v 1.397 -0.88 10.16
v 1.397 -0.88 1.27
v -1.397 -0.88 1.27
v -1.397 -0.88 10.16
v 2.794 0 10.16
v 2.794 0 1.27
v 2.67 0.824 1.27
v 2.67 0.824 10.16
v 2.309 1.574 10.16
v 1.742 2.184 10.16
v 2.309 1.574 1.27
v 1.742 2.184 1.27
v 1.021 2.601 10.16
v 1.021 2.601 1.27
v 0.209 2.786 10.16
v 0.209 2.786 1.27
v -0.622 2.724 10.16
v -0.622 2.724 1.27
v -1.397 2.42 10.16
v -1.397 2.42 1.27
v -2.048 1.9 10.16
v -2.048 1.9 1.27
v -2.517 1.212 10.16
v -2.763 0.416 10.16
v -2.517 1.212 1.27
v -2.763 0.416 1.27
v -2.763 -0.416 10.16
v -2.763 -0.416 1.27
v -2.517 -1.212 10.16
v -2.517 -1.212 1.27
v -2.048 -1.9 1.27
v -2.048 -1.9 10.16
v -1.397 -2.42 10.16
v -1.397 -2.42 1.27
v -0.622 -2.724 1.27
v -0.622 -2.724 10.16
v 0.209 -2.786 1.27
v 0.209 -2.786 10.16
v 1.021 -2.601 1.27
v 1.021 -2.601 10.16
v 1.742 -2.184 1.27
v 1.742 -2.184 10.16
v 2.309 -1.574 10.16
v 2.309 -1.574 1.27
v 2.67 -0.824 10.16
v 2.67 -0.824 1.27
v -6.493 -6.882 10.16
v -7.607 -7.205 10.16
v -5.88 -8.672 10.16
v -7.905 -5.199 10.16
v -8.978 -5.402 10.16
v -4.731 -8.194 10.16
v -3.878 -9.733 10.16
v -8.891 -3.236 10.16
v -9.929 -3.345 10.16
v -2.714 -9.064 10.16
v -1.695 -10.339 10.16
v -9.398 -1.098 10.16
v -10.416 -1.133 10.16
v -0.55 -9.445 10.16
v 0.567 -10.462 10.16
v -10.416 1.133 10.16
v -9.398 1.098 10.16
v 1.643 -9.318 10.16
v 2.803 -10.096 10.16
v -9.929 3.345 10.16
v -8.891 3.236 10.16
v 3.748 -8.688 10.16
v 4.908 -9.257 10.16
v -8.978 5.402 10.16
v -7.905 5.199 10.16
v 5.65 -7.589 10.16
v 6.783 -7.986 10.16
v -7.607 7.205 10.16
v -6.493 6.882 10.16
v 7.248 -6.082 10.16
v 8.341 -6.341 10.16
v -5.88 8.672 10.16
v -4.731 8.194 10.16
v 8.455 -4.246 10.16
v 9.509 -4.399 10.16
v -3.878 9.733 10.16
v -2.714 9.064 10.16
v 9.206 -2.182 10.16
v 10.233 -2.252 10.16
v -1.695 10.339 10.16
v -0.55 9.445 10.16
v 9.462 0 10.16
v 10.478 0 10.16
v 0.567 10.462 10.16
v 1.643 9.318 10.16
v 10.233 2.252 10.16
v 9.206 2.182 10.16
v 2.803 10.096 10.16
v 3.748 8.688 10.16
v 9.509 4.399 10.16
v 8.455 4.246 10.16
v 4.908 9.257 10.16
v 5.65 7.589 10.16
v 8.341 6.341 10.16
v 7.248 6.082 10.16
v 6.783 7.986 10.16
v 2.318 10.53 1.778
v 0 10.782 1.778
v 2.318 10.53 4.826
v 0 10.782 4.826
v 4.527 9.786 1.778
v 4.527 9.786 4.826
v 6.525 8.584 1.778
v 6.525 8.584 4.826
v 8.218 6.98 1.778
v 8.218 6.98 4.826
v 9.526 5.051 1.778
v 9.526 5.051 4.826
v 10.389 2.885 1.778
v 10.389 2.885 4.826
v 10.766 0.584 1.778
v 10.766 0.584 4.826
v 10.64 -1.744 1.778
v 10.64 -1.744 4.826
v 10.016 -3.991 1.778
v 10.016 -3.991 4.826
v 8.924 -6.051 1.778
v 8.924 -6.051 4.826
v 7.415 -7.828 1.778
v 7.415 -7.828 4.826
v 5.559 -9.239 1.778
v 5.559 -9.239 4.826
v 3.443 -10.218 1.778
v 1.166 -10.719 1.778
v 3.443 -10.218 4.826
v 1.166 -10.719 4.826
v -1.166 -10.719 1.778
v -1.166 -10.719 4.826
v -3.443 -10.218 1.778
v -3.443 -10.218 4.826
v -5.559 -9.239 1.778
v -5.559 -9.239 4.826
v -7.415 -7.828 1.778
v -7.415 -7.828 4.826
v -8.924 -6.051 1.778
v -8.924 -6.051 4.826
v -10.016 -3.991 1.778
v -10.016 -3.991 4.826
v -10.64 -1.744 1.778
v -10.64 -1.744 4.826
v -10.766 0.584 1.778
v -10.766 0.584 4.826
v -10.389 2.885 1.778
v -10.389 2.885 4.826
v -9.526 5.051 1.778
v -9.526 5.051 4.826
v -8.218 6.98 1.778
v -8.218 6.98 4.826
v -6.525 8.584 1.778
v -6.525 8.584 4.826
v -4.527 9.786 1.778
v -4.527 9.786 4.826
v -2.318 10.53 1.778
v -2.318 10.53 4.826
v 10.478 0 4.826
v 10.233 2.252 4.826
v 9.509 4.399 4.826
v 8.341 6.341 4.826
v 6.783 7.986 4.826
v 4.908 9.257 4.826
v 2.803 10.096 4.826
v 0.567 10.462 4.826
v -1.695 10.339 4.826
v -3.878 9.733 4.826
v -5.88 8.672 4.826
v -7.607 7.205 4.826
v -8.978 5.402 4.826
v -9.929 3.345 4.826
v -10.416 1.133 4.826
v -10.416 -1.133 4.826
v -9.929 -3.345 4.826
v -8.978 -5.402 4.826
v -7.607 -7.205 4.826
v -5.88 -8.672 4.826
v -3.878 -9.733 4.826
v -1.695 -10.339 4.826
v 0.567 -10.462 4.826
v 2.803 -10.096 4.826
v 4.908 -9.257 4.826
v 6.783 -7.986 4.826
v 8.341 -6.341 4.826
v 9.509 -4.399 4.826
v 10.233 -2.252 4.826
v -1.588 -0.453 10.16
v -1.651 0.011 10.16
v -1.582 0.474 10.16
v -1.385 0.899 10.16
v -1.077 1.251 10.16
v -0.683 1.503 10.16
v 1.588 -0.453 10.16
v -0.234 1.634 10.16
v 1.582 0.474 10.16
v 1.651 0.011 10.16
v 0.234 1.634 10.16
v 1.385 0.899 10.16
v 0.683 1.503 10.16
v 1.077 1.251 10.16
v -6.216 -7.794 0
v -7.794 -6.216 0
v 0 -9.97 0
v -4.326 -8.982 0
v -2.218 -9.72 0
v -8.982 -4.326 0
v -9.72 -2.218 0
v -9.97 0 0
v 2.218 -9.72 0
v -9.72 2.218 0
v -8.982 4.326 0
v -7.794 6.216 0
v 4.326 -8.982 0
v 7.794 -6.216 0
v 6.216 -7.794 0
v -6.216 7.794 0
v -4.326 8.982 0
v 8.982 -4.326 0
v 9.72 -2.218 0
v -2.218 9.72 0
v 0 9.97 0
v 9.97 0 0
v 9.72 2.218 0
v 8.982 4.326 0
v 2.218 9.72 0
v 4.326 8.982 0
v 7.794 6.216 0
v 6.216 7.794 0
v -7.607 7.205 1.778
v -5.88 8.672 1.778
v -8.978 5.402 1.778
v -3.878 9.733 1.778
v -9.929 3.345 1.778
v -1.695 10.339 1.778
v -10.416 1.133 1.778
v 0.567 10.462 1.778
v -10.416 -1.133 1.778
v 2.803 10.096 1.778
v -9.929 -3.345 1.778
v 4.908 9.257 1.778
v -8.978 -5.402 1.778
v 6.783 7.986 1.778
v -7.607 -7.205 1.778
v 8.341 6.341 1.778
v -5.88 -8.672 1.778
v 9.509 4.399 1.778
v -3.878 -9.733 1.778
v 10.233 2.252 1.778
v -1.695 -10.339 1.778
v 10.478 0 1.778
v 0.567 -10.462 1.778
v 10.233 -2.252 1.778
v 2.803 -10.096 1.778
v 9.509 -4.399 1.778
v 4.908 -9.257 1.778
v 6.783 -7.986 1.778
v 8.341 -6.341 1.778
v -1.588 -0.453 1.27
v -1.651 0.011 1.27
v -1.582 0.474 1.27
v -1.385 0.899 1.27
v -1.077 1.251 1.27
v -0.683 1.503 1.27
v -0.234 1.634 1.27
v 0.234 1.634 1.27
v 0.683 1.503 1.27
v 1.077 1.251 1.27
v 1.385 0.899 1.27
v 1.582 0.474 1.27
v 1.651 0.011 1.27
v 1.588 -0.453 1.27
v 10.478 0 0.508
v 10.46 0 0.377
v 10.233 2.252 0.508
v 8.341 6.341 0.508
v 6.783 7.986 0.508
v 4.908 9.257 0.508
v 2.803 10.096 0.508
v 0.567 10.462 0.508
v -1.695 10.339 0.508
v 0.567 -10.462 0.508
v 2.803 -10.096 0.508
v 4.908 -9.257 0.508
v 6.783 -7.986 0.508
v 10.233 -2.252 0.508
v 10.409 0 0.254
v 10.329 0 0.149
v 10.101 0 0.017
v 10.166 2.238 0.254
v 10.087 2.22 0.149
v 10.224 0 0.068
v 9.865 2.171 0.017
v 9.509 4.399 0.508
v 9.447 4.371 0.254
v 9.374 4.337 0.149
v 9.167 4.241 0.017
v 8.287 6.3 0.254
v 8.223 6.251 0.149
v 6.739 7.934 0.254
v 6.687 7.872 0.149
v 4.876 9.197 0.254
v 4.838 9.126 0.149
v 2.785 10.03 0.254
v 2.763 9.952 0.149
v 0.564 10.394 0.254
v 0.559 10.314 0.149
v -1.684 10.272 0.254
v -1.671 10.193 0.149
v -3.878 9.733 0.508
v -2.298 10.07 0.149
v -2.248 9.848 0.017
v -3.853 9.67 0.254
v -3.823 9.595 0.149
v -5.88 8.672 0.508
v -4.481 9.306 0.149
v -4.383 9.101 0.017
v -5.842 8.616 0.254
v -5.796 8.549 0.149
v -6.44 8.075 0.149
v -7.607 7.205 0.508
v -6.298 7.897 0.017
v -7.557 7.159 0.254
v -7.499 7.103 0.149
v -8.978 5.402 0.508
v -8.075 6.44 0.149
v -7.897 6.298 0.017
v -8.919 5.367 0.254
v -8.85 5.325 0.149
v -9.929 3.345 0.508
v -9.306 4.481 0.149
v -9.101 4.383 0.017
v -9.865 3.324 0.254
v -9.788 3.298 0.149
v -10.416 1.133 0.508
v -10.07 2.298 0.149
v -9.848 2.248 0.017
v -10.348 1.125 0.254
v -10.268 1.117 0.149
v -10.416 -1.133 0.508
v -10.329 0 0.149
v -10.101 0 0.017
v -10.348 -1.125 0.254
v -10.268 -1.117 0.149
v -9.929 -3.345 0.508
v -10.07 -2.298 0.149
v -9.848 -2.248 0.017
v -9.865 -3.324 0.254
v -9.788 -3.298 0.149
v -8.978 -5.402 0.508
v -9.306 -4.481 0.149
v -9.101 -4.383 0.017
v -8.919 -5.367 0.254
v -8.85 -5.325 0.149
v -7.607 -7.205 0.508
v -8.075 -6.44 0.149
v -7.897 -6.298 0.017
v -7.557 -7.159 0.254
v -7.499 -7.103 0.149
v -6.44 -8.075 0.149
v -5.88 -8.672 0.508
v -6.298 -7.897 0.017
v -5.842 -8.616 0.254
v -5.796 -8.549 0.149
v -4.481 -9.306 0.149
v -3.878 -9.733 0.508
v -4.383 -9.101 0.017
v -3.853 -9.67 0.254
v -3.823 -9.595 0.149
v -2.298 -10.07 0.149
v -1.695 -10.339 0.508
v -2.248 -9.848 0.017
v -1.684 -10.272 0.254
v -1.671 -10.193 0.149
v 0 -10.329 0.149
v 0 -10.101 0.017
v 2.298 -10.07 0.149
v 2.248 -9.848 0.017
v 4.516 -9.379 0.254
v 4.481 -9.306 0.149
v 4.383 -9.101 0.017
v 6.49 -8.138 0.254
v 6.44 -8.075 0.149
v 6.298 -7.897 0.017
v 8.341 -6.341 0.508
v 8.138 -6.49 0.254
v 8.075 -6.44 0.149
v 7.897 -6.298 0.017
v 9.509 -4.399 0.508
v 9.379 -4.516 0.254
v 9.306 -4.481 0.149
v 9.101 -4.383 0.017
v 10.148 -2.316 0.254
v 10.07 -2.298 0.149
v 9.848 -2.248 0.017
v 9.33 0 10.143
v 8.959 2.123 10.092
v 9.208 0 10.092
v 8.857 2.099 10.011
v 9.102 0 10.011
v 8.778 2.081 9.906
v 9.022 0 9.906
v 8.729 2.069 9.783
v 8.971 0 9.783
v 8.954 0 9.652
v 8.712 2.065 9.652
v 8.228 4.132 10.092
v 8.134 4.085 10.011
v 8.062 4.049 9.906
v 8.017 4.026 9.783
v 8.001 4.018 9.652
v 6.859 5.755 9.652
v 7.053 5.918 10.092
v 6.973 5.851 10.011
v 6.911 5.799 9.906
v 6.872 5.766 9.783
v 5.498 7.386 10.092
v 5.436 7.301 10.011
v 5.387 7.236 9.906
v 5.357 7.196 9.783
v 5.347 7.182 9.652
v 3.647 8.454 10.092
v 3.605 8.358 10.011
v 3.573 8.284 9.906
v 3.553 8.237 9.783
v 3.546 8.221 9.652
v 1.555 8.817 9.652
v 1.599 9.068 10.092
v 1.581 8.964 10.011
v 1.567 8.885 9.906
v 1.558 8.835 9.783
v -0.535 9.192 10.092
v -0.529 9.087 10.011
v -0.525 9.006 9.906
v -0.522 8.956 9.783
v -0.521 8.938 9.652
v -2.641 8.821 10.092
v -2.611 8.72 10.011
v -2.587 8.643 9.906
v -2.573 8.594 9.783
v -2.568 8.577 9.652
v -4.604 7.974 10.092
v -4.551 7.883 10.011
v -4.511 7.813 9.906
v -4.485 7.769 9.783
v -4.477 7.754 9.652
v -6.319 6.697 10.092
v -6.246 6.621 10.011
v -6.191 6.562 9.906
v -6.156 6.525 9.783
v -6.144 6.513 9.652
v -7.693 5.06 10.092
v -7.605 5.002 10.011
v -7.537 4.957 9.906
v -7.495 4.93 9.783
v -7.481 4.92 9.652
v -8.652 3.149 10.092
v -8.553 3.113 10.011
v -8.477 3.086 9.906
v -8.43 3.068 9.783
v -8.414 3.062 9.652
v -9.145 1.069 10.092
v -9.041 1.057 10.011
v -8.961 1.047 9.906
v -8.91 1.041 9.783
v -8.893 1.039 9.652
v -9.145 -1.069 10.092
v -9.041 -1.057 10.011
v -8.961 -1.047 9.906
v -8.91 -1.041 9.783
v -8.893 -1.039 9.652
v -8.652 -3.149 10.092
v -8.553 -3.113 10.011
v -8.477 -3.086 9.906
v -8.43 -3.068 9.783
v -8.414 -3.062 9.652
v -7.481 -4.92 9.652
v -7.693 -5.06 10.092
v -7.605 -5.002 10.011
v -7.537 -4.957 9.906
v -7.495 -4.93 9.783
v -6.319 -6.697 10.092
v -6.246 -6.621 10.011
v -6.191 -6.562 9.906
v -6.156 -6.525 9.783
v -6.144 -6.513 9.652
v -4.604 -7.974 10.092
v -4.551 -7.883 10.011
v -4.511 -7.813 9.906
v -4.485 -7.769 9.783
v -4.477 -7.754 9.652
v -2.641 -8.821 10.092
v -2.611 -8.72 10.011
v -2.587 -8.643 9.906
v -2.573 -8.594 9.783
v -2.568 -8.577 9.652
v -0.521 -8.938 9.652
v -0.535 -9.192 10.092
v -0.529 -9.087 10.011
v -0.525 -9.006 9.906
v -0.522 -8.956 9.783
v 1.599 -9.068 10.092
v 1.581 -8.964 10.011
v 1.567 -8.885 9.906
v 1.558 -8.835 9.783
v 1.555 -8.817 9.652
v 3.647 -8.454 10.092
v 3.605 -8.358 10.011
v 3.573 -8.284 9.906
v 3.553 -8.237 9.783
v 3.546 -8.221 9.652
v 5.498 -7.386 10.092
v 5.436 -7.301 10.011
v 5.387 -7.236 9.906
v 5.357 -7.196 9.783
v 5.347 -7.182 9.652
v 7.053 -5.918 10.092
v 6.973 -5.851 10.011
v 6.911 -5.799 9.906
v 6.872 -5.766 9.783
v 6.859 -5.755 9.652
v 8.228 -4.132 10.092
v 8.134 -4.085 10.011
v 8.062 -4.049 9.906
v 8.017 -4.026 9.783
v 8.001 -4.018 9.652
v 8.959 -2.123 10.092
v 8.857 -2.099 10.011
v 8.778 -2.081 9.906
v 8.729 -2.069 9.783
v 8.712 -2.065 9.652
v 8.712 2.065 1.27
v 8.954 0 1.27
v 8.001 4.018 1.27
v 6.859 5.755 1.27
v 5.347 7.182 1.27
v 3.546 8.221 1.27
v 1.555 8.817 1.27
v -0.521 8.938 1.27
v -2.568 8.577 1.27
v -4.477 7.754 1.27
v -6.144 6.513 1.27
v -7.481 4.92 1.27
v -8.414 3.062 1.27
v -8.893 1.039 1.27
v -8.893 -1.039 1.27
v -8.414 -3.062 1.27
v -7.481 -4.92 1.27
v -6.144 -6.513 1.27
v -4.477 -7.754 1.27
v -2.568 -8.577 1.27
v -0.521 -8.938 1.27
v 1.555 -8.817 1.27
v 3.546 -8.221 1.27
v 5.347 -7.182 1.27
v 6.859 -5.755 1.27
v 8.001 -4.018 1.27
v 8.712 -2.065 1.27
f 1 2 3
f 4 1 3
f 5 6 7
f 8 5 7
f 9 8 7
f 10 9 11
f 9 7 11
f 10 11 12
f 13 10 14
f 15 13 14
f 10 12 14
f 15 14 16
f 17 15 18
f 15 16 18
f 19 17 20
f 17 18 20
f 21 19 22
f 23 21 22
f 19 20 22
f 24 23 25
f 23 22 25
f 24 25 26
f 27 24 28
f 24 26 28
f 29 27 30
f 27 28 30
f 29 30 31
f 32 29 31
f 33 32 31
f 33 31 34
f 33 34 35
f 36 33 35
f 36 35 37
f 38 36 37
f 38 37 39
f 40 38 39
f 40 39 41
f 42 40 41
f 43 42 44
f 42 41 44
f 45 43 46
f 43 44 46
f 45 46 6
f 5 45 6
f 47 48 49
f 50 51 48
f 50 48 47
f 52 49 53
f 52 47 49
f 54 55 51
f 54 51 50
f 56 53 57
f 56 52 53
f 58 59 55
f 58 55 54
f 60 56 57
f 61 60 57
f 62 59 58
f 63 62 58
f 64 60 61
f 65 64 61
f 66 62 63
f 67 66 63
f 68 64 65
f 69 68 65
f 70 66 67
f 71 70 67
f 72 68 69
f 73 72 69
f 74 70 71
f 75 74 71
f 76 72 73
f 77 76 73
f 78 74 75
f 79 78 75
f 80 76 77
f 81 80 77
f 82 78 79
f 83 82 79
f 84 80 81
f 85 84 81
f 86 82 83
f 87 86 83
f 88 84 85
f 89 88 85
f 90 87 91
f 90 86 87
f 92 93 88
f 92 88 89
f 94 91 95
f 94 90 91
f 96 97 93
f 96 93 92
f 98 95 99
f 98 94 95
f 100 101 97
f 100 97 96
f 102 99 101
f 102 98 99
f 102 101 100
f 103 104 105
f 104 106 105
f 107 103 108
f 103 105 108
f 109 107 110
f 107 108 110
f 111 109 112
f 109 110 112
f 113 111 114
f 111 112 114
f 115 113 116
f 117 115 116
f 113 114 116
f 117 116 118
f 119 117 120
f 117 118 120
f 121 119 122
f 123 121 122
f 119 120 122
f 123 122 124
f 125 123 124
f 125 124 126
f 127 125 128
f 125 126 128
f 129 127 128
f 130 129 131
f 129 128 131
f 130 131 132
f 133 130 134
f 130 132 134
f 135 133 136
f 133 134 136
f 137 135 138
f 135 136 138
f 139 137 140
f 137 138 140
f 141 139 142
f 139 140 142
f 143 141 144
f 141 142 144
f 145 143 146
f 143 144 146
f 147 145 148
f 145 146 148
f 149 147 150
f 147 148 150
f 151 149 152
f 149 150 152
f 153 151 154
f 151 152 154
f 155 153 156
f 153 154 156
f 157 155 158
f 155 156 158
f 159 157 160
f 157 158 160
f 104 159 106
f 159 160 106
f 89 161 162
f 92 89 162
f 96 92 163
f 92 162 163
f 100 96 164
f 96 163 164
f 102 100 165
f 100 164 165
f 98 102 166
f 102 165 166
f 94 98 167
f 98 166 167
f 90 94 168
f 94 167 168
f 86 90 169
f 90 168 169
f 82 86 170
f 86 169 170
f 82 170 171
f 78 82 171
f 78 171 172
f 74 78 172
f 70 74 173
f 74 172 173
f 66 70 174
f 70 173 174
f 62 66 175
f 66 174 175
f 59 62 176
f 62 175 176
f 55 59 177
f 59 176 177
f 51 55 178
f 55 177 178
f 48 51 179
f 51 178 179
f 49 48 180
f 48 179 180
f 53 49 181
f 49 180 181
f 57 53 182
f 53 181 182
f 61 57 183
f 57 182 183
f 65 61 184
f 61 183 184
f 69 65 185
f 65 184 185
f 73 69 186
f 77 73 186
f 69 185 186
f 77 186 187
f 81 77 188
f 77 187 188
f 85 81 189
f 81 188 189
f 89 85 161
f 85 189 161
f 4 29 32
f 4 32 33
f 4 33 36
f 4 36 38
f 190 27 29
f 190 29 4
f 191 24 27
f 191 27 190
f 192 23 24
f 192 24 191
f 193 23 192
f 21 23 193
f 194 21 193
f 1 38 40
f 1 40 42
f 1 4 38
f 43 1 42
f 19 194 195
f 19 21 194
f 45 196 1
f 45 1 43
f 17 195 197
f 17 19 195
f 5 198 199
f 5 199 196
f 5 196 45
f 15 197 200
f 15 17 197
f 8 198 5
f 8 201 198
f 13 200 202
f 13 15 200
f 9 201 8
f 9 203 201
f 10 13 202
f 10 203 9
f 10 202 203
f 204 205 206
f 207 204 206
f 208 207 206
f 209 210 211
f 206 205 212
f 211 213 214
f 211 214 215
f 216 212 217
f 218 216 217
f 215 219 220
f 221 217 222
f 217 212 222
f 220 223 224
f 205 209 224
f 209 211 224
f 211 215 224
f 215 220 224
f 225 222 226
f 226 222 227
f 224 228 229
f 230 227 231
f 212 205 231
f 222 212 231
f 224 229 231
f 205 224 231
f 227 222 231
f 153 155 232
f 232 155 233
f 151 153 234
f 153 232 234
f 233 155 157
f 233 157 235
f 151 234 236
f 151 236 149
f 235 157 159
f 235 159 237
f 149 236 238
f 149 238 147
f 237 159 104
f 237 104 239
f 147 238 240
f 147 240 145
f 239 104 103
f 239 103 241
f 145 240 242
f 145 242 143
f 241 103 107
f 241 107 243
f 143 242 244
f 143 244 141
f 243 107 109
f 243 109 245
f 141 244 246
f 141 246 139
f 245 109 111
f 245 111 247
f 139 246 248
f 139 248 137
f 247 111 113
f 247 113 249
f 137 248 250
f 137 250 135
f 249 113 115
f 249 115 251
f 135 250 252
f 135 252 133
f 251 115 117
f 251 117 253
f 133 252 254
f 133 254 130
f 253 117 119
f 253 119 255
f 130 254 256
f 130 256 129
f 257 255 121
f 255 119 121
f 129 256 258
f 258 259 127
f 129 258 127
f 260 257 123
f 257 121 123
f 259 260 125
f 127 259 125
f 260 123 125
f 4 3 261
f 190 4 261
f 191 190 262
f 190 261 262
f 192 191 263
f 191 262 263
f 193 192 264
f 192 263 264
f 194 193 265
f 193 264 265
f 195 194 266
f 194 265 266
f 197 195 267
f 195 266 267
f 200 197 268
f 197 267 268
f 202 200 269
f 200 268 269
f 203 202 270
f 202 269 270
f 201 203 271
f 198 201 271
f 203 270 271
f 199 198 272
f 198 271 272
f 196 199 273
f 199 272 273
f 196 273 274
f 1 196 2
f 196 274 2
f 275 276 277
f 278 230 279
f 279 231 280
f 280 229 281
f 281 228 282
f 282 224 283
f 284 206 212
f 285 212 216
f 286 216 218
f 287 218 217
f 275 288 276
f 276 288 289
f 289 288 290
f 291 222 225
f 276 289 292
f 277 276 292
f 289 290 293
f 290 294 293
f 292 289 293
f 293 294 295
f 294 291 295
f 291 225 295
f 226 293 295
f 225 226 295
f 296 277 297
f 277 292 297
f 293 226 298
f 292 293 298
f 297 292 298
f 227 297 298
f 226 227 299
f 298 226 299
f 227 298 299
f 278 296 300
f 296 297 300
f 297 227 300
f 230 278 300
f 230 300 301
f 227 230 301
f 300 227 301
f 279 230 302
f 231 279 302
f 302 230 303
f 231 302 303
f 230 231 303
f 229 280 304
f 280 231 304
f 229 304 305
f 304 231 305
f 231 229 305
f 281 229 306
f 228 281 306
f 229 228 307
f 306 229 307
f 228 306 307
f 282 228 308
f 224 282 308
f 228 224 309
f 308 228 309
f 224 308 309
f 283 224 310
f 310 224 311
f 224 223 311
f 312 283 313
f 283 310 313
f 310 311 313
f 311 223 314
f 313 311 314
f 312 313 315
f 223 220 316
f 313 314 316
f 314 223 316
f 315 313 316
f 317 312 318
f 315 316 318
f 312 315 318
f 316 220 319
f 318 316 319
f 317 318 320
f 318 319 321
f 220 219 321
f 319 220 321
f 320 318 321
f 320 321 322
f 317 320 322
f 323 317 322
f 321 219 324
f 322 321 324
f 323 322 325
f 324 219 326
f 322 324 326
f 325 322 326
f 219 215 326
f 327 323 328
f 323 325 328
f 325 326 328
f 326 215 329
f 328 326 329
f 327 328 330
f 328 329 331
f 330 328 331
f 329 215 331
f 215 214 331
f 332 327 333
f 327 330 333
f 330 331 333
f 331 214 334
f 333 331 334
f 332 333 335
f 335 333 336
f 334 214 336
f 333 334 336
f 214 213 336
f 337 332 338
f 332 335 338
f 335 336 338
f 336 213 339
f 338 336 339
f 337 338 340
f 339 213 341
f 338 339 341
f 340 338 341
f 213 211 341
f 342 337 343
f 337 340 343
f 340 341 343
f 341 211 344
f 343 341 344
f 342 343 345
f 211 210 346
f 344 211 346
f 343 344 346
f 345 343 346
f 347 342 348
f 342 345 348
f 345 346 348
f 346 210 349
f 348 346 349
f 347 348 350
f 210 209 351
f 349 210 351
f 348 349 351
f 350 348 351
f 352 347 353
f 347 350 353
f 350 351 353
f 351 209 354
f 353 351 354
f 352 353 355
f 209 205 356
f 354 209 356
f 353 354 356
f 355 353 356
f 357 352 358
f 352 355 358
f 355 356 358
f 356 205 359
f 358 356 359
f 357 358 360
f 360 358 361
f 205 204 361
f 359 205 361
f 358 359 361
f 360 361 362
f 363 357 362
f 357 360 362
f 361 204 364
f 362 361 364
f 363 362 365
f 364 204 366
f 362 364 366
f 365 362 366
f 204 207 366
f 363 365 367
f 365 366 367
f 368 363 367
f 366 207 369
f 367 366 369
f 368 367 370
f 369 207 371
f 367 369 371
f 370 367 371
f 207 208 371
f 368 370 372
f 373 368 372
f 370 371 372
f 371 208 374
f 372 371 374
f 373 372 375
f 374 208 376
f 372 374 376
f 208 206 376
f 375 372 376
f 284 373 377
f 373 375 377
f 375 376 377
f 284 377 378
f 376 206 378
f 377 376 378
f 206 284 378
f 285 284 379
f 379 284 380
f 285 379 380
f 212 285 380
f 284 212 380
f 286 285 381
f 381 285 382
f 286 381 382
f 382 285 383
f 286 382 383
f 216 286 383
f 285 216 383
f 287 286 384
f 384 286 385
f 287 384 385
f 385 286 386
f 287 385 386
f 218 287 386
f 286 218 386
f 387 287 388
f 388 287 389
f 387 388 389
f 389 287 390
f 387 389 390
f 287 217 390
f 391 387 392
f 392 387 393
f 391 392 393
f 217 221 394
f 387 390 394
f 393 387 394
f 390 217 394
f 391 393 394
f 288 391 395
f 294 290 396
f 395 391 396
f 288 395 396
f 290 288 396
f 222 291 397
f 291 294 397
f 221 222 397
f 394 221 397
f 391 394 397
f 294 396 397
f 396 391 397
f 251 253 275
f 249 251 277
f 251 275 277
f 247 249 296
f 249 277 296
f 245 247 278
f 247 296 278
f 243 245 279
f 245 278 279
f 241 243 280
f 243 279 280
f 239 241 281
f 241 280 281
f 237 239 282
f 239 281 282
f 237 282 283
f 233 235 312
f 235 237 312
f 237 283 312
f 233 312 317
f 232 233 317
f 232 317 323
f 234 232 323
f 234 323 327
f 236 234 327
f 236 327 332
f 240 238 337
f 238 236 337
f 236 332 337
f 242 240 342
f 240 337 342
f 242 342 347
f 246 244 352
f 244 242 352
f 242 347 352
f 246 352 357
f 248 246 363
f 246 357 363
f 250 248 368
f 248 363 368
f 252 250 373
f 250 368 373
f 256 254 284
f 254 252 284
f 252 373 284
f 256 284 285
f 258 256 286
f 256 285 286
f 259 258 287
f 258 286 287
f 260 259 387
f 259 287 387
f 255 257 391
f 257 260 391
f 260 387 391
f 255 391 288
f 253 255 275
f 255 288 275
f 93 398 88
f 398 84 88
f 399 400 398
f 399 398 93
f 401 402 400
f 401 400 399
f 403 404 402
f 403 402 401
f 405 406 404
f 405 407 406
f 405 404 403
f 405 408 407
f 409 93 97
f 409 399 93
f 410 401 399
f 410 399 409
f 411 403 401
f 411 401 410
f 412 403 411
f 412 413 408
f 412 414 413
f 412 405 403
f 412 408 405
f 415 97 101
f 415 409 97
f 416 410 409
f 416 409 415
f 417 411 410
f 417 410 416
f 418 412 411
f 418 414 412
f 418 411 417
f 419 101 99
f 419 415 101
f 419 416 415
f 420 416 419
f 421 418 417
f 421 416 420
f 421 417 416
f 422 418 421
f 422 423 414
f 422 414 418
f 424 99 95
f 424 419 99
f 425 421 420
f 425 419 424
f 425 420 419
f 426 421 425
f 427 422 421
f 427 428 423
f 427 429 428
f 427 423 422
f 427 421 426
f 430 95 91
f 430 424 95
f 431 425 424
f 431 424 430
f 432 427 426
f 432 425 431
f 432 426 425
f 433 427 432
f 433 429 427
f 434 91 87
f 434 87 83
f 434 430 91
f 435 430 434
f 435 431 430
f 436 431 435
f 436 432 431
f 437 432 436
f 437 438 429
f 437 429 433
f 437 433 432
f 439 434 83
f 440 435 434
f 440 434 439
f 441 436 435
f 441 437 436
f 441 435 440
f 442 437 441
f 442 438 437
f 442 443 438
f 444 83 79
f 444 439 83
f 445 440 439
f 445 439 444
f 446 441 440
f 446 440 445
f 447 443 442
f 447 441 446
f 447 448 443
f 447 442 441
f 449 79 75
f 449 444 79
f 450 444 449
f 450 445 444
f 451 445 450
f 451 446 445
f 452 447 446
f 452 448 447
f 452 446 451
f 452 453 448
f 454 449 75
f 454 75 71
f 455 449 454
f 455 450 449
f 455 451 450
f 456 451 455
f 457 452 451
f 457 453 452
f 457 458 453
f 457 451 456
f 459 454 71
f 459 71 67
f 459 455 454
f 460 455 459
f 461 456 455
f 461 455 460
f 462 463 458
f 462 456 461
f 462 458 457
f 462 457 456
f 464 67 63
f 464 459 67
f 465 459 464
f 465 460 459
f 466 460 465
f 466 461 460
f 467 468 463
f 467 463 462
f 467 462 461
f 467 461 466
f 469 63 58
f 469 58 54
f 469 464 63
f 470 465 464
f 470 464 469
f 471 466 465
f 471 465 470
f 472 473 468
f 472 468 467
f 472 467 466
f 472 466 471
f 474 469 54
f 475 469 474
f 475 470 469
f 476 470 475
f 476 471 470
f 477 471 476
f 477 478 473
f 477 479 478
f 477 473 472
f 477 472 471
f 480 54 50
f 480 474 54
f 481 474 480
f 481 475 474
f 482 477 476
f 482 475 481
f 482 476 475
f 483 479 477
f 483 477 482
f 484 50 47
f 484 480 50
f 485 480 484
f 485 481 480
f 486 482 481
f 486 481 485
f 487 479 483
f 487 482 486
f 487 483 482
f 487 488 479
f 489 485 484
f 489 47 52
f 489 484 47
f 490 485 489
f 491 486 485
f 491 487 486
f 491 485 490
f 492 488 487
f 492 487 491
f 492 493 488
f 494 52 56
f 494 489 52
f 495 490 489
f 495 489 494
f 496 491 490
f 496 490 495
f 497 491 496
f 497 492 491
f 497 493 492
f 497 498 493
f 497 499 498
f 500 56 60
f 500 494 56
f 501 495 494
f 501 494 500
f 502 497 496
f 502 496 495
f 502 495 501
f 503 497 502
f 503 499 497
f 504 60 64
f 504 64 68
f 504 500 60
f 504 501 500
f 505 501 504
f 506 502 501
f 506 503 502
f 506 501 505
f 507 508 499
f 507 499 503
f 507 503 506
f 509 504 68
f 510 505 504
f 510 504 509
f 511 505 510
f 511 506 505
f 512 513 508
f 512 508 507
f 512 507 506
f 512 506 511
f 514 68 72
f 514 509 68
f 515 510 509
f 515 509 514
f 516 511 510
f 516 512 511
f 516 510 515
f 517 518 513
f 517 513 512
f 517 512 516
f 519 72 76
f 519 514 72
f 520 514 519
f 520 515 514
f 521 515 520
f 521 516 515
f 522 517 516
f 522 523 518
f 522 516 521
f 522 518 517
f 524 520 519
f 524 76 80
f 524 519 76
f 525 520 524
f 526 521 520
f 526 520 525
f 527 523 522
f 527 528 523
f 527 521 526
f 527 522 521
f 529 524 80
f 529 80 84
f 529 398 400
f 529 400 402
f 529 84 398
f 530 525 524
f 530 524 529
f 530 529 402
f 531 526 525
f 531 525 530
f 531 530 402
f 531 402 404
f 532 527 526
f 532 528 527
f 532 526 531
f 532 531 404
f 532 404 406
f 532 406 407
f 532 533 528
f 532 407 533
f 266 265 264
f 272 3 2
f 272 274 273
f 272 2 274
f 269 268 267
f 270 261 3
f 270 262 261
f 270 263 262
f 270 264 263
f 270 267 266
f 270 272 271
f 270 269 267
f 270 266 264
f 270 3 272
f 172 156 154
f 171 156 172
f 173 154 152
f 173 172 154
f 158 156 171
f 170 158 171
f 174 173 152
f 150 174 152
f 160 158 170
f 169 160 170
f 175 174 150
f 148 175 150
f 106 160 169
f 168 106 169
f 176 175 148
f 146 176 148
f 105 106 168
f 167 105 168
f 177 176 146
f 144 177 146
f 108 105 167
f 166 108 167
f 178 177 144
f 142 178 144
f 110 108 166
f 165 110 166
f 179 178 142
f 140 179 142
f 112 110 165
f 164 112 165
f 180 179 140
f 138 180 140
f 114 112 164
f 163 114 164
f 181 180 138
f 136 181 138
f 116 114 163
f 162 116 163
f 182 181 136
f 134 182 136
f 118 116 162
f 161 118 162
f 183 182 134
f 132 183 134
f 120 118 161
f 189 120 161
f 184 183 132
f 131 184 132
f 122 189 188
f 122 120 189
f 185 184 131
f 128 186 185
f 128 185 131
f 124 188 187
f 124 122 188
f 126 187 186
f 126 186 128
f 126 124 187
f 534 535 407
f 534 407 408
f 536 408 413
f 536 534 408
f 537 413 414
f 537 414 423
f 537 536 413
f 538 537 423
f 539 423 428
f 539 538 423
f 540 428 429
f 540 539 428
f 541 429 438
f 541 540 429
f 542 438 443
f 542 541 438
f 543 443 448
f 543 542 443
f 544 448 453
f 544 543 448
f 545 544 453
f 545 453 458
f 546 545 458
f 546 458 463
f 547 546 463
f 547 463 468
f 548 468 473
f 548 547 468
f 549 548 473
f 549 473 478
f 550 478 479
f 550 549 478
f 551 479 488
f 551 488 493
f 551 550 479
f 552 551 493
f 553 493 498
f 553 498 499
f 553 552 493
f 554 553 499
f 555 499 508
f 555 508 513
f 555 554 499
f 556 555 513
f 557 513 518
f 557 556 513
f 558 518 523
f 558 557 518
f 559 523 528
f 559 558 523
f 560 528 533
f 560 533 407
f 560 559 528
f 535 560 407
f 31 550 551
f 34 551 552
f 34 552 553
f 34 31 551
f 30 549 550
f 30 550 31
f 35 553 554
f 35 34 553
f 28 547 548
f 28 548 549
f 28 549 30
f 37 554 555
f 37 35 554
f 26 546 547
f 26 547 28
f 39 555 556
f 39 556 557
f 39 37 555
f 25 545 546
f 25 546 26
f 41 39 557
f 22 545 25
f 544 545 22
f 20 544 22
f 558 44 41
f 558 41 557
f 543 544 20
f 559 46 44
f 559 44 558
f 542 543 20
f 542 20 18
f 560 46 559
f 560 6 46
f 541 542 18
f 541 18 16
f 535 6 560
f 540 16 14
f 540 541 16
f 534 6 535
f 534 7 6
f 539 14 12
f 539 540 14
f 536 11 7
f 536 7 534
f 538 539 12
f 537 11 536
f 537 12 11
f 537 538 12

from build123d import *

# Parameters (mm, degrees)
F0_R     = 10.4775
F1_DEPTH = 1.27
F2_R     = 10.4775
F2_R_2   = 8.9535
F2_R_3   = 2.794
F3_DEPTH = 8.89
F4_W     = 0.3048
F4_H     = 3.048
F6_R     = 0.508


with BuildPart() as f1:
    # F0 (on Top) → F1 (new body)
    with BuildSketch(Plane.XY):
        Circle(F0_R)
    extrude(amount=F1_DEPTH)

    # F2 (on face) → F3 (join)
    with BuildSketch(Plane.XY.offset(1.27)):
        Circle(F2_R)
        Circle(F2_R_2, mode=Mode.SUBTRACT)
        Circle(F2_R_3)
        with BuildLine():
            ThreePointArc((-1.397, -0.879882), (0, 1.651), (1.397, -0.879882))
            Line((1.397, -0.879882), (-1.397, -0.879882))
        make_face(mode=Mode.SUBTRACT)
    extrude(amount=F3_DEPTH)

    # F4 (on Right) → F5 (revolve)
    with BuildSketch(Plane.YZ):
        with Locations((10.629893, 3.302)):
            Rectangle(F4_W, F4_H)
    revolve(axis=Axis((0, 0, 0), (0, 0, -1)))

    # F6
    f6_edges = [f1.edges().sort_by_distance(p)[0] for p in [
        (-10.4775, 0, 0),
        (-8.9535, 0, 10.16),
    ]]
    fillet(f6_edges, radius=F6_R)


solid = f1.part
